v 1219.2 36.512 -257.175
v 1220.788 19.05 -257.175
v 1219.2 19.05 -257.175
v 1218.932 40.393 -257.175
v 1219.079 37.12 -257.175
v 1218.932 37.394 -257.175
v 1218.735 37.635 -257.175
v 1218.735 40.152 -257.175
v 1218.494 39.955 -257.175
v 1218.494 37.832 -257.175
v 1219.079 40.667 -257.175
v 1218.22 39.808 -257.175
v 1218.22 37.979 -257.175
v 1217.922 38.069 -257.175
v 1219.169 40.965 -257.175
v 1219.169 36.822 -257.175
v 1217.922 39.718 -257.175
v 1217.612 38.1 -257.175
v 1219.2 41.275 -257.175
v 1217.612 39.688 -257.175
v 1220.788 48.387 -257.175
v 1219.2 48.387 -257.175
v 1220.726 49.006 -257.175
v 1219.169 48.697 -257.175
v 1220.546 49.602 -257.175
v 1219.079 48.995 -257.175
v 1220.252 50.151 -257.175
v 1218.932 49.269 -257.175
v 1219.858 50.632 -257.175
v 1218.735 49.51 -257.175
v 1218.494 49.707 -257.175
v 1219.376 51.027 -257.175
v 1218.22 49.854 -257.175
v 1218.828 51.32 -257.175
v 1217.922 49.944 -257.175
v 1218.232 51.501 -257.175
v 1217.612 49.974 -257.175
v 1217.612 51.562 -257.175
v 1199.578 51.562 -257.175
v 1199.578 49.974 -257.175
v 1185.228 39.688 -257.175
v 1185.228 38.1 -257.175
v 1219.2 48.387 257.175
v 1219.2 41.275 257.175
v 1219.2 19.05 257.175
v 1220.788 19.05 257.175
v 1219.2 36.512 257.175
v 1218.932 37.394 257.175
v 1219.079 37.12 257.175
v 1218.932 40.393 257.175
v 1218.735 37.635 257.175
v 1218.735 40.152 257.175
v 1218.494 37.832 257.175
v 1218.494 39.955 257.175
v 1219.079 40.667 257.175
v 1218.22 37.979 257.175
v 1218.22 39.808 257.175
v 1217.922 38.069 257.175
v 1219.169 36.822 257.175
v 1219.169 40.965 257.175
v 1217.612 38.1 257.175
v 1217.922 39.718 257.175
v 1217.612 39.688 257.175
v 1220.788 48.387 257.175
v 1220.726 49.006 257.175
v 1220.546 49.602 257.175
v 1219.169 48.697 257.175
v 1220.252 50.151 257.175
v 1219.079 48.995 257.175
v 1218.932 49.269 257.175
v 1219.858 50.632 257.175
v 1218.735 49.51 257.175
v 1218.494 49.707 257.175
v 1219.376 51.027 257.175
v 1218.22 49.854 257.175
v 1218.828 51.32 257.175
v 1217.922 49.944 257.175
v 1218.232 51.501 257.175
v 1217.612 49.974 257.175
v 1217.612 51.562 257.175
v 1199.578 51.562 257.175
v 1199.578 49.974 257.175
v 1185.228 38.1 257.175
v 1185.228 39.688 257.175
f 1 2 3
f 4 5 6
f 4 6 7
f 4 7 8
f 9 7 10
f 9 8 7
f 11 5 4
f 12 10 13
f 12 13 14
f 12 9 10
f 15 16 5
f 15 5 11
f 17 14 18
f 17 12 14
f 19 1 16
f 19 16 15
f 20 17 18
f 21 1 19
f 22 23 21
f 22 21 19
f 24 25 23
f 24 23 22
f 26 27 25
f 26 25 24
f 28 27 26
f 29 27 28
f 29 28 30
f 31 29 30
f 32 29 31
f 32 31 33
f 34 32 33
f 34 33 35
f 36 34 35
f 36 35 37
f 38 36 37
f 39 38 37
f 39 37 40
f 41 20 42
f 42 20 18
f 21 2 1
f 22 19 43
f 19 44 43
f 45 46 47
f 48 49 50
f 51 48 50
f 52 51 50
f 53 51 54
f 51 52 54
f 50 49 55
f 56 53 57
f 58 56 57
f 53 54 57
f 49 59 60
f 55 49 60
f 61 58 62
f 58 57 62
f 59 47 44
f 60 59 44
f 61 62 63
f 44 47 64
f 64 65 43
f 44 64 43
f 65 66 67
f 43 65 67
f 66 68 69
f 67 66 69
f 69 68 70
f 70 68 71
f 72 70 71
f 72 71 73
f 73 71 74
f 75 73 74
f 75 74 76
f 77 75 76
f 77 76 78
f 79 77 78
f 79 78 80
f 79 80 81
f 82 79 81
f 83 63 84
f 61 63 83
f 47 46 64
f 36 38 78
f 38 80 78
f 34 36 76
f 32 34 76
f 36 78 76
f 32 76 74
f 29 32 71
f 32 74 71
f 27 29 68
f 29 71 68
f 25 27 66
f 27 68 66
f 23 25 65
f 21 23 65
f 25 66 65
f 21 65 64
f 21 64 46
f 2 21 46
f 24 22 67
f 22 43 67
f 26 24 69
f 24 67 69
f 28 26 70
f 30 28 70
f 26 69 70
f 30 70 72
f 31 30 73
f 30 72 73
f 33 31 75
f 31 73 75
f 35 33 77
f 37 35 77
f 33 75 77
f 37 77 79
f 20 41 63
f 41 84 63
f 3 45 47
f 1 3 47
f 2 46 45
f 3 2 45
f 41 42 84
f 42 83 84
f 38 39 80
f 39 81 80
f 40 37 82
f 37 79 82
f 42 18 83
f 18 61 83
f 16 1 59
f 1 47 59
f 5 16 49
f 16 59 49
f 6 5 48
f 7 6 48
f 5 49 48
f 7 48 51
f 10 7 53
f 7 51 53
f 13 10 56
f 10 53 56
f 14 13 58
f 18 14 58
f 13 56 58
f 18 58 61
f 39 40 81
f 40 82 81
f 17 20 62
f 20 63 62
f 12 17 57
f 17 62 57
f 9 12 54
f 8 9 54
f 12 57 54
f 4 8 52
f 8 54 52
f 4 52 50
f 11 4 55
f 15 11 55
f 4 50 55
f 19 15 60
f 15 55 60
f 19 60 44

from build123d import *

# Parameters (mm, degrees)
EXTRUDE1_DEPTH = 257.175


with BuildPart() as part:
    # Sketch1 → Extrude1 (new body, symmetric)
    with BuildSketch(Plane.XY):
        with BuildLine():
            Line((1219.2, 19.05), (1219.2, 36.5125))
            ThreePointArc((1219.2, 36.5125), (1218.735032015, 37.635032015), (1217.6125, 38.1))
            Line((1217.6125, 38.1), (1185.2275, 38.1))
            Line((1185.2275, 38.1), (1185.2275, 39.6875))
            Line((1185.2275, 39.6875), (1217.6125, 39.6875))
            ThreePointArc((1217.6125, 39.6875), (1218.735032015, 40.152467985), (1219.2, 41.275))
            Line((1219.2, 41.275), (1219.2, 48.387))
            ThreePointArc((1219.2, 48.387), (1218.735032015, 49.509532015), (1217.6125, 49.9745))
            Line((1217.6125, 49.9745), (1199.5785, 49.9745))
            Line((1199.5785, 49.9745), (1199.5785, 51.562))
            Line((1199.5785, 51.562), (1217.6125, 51.562))
            ThreePointArc((1217.6125, 51.562), (1219.85756403, 50.63206403), (1220.7875, 48.387))
            Line((1220.7875, 48.387), (1220.7875, 19.05))
            Line((1220.7875, 19.05), (1219.2, 19.05))
        make_face()
    extrude(amount=EXTRUDE1_DEPTH, both=True)


solid = part.part
